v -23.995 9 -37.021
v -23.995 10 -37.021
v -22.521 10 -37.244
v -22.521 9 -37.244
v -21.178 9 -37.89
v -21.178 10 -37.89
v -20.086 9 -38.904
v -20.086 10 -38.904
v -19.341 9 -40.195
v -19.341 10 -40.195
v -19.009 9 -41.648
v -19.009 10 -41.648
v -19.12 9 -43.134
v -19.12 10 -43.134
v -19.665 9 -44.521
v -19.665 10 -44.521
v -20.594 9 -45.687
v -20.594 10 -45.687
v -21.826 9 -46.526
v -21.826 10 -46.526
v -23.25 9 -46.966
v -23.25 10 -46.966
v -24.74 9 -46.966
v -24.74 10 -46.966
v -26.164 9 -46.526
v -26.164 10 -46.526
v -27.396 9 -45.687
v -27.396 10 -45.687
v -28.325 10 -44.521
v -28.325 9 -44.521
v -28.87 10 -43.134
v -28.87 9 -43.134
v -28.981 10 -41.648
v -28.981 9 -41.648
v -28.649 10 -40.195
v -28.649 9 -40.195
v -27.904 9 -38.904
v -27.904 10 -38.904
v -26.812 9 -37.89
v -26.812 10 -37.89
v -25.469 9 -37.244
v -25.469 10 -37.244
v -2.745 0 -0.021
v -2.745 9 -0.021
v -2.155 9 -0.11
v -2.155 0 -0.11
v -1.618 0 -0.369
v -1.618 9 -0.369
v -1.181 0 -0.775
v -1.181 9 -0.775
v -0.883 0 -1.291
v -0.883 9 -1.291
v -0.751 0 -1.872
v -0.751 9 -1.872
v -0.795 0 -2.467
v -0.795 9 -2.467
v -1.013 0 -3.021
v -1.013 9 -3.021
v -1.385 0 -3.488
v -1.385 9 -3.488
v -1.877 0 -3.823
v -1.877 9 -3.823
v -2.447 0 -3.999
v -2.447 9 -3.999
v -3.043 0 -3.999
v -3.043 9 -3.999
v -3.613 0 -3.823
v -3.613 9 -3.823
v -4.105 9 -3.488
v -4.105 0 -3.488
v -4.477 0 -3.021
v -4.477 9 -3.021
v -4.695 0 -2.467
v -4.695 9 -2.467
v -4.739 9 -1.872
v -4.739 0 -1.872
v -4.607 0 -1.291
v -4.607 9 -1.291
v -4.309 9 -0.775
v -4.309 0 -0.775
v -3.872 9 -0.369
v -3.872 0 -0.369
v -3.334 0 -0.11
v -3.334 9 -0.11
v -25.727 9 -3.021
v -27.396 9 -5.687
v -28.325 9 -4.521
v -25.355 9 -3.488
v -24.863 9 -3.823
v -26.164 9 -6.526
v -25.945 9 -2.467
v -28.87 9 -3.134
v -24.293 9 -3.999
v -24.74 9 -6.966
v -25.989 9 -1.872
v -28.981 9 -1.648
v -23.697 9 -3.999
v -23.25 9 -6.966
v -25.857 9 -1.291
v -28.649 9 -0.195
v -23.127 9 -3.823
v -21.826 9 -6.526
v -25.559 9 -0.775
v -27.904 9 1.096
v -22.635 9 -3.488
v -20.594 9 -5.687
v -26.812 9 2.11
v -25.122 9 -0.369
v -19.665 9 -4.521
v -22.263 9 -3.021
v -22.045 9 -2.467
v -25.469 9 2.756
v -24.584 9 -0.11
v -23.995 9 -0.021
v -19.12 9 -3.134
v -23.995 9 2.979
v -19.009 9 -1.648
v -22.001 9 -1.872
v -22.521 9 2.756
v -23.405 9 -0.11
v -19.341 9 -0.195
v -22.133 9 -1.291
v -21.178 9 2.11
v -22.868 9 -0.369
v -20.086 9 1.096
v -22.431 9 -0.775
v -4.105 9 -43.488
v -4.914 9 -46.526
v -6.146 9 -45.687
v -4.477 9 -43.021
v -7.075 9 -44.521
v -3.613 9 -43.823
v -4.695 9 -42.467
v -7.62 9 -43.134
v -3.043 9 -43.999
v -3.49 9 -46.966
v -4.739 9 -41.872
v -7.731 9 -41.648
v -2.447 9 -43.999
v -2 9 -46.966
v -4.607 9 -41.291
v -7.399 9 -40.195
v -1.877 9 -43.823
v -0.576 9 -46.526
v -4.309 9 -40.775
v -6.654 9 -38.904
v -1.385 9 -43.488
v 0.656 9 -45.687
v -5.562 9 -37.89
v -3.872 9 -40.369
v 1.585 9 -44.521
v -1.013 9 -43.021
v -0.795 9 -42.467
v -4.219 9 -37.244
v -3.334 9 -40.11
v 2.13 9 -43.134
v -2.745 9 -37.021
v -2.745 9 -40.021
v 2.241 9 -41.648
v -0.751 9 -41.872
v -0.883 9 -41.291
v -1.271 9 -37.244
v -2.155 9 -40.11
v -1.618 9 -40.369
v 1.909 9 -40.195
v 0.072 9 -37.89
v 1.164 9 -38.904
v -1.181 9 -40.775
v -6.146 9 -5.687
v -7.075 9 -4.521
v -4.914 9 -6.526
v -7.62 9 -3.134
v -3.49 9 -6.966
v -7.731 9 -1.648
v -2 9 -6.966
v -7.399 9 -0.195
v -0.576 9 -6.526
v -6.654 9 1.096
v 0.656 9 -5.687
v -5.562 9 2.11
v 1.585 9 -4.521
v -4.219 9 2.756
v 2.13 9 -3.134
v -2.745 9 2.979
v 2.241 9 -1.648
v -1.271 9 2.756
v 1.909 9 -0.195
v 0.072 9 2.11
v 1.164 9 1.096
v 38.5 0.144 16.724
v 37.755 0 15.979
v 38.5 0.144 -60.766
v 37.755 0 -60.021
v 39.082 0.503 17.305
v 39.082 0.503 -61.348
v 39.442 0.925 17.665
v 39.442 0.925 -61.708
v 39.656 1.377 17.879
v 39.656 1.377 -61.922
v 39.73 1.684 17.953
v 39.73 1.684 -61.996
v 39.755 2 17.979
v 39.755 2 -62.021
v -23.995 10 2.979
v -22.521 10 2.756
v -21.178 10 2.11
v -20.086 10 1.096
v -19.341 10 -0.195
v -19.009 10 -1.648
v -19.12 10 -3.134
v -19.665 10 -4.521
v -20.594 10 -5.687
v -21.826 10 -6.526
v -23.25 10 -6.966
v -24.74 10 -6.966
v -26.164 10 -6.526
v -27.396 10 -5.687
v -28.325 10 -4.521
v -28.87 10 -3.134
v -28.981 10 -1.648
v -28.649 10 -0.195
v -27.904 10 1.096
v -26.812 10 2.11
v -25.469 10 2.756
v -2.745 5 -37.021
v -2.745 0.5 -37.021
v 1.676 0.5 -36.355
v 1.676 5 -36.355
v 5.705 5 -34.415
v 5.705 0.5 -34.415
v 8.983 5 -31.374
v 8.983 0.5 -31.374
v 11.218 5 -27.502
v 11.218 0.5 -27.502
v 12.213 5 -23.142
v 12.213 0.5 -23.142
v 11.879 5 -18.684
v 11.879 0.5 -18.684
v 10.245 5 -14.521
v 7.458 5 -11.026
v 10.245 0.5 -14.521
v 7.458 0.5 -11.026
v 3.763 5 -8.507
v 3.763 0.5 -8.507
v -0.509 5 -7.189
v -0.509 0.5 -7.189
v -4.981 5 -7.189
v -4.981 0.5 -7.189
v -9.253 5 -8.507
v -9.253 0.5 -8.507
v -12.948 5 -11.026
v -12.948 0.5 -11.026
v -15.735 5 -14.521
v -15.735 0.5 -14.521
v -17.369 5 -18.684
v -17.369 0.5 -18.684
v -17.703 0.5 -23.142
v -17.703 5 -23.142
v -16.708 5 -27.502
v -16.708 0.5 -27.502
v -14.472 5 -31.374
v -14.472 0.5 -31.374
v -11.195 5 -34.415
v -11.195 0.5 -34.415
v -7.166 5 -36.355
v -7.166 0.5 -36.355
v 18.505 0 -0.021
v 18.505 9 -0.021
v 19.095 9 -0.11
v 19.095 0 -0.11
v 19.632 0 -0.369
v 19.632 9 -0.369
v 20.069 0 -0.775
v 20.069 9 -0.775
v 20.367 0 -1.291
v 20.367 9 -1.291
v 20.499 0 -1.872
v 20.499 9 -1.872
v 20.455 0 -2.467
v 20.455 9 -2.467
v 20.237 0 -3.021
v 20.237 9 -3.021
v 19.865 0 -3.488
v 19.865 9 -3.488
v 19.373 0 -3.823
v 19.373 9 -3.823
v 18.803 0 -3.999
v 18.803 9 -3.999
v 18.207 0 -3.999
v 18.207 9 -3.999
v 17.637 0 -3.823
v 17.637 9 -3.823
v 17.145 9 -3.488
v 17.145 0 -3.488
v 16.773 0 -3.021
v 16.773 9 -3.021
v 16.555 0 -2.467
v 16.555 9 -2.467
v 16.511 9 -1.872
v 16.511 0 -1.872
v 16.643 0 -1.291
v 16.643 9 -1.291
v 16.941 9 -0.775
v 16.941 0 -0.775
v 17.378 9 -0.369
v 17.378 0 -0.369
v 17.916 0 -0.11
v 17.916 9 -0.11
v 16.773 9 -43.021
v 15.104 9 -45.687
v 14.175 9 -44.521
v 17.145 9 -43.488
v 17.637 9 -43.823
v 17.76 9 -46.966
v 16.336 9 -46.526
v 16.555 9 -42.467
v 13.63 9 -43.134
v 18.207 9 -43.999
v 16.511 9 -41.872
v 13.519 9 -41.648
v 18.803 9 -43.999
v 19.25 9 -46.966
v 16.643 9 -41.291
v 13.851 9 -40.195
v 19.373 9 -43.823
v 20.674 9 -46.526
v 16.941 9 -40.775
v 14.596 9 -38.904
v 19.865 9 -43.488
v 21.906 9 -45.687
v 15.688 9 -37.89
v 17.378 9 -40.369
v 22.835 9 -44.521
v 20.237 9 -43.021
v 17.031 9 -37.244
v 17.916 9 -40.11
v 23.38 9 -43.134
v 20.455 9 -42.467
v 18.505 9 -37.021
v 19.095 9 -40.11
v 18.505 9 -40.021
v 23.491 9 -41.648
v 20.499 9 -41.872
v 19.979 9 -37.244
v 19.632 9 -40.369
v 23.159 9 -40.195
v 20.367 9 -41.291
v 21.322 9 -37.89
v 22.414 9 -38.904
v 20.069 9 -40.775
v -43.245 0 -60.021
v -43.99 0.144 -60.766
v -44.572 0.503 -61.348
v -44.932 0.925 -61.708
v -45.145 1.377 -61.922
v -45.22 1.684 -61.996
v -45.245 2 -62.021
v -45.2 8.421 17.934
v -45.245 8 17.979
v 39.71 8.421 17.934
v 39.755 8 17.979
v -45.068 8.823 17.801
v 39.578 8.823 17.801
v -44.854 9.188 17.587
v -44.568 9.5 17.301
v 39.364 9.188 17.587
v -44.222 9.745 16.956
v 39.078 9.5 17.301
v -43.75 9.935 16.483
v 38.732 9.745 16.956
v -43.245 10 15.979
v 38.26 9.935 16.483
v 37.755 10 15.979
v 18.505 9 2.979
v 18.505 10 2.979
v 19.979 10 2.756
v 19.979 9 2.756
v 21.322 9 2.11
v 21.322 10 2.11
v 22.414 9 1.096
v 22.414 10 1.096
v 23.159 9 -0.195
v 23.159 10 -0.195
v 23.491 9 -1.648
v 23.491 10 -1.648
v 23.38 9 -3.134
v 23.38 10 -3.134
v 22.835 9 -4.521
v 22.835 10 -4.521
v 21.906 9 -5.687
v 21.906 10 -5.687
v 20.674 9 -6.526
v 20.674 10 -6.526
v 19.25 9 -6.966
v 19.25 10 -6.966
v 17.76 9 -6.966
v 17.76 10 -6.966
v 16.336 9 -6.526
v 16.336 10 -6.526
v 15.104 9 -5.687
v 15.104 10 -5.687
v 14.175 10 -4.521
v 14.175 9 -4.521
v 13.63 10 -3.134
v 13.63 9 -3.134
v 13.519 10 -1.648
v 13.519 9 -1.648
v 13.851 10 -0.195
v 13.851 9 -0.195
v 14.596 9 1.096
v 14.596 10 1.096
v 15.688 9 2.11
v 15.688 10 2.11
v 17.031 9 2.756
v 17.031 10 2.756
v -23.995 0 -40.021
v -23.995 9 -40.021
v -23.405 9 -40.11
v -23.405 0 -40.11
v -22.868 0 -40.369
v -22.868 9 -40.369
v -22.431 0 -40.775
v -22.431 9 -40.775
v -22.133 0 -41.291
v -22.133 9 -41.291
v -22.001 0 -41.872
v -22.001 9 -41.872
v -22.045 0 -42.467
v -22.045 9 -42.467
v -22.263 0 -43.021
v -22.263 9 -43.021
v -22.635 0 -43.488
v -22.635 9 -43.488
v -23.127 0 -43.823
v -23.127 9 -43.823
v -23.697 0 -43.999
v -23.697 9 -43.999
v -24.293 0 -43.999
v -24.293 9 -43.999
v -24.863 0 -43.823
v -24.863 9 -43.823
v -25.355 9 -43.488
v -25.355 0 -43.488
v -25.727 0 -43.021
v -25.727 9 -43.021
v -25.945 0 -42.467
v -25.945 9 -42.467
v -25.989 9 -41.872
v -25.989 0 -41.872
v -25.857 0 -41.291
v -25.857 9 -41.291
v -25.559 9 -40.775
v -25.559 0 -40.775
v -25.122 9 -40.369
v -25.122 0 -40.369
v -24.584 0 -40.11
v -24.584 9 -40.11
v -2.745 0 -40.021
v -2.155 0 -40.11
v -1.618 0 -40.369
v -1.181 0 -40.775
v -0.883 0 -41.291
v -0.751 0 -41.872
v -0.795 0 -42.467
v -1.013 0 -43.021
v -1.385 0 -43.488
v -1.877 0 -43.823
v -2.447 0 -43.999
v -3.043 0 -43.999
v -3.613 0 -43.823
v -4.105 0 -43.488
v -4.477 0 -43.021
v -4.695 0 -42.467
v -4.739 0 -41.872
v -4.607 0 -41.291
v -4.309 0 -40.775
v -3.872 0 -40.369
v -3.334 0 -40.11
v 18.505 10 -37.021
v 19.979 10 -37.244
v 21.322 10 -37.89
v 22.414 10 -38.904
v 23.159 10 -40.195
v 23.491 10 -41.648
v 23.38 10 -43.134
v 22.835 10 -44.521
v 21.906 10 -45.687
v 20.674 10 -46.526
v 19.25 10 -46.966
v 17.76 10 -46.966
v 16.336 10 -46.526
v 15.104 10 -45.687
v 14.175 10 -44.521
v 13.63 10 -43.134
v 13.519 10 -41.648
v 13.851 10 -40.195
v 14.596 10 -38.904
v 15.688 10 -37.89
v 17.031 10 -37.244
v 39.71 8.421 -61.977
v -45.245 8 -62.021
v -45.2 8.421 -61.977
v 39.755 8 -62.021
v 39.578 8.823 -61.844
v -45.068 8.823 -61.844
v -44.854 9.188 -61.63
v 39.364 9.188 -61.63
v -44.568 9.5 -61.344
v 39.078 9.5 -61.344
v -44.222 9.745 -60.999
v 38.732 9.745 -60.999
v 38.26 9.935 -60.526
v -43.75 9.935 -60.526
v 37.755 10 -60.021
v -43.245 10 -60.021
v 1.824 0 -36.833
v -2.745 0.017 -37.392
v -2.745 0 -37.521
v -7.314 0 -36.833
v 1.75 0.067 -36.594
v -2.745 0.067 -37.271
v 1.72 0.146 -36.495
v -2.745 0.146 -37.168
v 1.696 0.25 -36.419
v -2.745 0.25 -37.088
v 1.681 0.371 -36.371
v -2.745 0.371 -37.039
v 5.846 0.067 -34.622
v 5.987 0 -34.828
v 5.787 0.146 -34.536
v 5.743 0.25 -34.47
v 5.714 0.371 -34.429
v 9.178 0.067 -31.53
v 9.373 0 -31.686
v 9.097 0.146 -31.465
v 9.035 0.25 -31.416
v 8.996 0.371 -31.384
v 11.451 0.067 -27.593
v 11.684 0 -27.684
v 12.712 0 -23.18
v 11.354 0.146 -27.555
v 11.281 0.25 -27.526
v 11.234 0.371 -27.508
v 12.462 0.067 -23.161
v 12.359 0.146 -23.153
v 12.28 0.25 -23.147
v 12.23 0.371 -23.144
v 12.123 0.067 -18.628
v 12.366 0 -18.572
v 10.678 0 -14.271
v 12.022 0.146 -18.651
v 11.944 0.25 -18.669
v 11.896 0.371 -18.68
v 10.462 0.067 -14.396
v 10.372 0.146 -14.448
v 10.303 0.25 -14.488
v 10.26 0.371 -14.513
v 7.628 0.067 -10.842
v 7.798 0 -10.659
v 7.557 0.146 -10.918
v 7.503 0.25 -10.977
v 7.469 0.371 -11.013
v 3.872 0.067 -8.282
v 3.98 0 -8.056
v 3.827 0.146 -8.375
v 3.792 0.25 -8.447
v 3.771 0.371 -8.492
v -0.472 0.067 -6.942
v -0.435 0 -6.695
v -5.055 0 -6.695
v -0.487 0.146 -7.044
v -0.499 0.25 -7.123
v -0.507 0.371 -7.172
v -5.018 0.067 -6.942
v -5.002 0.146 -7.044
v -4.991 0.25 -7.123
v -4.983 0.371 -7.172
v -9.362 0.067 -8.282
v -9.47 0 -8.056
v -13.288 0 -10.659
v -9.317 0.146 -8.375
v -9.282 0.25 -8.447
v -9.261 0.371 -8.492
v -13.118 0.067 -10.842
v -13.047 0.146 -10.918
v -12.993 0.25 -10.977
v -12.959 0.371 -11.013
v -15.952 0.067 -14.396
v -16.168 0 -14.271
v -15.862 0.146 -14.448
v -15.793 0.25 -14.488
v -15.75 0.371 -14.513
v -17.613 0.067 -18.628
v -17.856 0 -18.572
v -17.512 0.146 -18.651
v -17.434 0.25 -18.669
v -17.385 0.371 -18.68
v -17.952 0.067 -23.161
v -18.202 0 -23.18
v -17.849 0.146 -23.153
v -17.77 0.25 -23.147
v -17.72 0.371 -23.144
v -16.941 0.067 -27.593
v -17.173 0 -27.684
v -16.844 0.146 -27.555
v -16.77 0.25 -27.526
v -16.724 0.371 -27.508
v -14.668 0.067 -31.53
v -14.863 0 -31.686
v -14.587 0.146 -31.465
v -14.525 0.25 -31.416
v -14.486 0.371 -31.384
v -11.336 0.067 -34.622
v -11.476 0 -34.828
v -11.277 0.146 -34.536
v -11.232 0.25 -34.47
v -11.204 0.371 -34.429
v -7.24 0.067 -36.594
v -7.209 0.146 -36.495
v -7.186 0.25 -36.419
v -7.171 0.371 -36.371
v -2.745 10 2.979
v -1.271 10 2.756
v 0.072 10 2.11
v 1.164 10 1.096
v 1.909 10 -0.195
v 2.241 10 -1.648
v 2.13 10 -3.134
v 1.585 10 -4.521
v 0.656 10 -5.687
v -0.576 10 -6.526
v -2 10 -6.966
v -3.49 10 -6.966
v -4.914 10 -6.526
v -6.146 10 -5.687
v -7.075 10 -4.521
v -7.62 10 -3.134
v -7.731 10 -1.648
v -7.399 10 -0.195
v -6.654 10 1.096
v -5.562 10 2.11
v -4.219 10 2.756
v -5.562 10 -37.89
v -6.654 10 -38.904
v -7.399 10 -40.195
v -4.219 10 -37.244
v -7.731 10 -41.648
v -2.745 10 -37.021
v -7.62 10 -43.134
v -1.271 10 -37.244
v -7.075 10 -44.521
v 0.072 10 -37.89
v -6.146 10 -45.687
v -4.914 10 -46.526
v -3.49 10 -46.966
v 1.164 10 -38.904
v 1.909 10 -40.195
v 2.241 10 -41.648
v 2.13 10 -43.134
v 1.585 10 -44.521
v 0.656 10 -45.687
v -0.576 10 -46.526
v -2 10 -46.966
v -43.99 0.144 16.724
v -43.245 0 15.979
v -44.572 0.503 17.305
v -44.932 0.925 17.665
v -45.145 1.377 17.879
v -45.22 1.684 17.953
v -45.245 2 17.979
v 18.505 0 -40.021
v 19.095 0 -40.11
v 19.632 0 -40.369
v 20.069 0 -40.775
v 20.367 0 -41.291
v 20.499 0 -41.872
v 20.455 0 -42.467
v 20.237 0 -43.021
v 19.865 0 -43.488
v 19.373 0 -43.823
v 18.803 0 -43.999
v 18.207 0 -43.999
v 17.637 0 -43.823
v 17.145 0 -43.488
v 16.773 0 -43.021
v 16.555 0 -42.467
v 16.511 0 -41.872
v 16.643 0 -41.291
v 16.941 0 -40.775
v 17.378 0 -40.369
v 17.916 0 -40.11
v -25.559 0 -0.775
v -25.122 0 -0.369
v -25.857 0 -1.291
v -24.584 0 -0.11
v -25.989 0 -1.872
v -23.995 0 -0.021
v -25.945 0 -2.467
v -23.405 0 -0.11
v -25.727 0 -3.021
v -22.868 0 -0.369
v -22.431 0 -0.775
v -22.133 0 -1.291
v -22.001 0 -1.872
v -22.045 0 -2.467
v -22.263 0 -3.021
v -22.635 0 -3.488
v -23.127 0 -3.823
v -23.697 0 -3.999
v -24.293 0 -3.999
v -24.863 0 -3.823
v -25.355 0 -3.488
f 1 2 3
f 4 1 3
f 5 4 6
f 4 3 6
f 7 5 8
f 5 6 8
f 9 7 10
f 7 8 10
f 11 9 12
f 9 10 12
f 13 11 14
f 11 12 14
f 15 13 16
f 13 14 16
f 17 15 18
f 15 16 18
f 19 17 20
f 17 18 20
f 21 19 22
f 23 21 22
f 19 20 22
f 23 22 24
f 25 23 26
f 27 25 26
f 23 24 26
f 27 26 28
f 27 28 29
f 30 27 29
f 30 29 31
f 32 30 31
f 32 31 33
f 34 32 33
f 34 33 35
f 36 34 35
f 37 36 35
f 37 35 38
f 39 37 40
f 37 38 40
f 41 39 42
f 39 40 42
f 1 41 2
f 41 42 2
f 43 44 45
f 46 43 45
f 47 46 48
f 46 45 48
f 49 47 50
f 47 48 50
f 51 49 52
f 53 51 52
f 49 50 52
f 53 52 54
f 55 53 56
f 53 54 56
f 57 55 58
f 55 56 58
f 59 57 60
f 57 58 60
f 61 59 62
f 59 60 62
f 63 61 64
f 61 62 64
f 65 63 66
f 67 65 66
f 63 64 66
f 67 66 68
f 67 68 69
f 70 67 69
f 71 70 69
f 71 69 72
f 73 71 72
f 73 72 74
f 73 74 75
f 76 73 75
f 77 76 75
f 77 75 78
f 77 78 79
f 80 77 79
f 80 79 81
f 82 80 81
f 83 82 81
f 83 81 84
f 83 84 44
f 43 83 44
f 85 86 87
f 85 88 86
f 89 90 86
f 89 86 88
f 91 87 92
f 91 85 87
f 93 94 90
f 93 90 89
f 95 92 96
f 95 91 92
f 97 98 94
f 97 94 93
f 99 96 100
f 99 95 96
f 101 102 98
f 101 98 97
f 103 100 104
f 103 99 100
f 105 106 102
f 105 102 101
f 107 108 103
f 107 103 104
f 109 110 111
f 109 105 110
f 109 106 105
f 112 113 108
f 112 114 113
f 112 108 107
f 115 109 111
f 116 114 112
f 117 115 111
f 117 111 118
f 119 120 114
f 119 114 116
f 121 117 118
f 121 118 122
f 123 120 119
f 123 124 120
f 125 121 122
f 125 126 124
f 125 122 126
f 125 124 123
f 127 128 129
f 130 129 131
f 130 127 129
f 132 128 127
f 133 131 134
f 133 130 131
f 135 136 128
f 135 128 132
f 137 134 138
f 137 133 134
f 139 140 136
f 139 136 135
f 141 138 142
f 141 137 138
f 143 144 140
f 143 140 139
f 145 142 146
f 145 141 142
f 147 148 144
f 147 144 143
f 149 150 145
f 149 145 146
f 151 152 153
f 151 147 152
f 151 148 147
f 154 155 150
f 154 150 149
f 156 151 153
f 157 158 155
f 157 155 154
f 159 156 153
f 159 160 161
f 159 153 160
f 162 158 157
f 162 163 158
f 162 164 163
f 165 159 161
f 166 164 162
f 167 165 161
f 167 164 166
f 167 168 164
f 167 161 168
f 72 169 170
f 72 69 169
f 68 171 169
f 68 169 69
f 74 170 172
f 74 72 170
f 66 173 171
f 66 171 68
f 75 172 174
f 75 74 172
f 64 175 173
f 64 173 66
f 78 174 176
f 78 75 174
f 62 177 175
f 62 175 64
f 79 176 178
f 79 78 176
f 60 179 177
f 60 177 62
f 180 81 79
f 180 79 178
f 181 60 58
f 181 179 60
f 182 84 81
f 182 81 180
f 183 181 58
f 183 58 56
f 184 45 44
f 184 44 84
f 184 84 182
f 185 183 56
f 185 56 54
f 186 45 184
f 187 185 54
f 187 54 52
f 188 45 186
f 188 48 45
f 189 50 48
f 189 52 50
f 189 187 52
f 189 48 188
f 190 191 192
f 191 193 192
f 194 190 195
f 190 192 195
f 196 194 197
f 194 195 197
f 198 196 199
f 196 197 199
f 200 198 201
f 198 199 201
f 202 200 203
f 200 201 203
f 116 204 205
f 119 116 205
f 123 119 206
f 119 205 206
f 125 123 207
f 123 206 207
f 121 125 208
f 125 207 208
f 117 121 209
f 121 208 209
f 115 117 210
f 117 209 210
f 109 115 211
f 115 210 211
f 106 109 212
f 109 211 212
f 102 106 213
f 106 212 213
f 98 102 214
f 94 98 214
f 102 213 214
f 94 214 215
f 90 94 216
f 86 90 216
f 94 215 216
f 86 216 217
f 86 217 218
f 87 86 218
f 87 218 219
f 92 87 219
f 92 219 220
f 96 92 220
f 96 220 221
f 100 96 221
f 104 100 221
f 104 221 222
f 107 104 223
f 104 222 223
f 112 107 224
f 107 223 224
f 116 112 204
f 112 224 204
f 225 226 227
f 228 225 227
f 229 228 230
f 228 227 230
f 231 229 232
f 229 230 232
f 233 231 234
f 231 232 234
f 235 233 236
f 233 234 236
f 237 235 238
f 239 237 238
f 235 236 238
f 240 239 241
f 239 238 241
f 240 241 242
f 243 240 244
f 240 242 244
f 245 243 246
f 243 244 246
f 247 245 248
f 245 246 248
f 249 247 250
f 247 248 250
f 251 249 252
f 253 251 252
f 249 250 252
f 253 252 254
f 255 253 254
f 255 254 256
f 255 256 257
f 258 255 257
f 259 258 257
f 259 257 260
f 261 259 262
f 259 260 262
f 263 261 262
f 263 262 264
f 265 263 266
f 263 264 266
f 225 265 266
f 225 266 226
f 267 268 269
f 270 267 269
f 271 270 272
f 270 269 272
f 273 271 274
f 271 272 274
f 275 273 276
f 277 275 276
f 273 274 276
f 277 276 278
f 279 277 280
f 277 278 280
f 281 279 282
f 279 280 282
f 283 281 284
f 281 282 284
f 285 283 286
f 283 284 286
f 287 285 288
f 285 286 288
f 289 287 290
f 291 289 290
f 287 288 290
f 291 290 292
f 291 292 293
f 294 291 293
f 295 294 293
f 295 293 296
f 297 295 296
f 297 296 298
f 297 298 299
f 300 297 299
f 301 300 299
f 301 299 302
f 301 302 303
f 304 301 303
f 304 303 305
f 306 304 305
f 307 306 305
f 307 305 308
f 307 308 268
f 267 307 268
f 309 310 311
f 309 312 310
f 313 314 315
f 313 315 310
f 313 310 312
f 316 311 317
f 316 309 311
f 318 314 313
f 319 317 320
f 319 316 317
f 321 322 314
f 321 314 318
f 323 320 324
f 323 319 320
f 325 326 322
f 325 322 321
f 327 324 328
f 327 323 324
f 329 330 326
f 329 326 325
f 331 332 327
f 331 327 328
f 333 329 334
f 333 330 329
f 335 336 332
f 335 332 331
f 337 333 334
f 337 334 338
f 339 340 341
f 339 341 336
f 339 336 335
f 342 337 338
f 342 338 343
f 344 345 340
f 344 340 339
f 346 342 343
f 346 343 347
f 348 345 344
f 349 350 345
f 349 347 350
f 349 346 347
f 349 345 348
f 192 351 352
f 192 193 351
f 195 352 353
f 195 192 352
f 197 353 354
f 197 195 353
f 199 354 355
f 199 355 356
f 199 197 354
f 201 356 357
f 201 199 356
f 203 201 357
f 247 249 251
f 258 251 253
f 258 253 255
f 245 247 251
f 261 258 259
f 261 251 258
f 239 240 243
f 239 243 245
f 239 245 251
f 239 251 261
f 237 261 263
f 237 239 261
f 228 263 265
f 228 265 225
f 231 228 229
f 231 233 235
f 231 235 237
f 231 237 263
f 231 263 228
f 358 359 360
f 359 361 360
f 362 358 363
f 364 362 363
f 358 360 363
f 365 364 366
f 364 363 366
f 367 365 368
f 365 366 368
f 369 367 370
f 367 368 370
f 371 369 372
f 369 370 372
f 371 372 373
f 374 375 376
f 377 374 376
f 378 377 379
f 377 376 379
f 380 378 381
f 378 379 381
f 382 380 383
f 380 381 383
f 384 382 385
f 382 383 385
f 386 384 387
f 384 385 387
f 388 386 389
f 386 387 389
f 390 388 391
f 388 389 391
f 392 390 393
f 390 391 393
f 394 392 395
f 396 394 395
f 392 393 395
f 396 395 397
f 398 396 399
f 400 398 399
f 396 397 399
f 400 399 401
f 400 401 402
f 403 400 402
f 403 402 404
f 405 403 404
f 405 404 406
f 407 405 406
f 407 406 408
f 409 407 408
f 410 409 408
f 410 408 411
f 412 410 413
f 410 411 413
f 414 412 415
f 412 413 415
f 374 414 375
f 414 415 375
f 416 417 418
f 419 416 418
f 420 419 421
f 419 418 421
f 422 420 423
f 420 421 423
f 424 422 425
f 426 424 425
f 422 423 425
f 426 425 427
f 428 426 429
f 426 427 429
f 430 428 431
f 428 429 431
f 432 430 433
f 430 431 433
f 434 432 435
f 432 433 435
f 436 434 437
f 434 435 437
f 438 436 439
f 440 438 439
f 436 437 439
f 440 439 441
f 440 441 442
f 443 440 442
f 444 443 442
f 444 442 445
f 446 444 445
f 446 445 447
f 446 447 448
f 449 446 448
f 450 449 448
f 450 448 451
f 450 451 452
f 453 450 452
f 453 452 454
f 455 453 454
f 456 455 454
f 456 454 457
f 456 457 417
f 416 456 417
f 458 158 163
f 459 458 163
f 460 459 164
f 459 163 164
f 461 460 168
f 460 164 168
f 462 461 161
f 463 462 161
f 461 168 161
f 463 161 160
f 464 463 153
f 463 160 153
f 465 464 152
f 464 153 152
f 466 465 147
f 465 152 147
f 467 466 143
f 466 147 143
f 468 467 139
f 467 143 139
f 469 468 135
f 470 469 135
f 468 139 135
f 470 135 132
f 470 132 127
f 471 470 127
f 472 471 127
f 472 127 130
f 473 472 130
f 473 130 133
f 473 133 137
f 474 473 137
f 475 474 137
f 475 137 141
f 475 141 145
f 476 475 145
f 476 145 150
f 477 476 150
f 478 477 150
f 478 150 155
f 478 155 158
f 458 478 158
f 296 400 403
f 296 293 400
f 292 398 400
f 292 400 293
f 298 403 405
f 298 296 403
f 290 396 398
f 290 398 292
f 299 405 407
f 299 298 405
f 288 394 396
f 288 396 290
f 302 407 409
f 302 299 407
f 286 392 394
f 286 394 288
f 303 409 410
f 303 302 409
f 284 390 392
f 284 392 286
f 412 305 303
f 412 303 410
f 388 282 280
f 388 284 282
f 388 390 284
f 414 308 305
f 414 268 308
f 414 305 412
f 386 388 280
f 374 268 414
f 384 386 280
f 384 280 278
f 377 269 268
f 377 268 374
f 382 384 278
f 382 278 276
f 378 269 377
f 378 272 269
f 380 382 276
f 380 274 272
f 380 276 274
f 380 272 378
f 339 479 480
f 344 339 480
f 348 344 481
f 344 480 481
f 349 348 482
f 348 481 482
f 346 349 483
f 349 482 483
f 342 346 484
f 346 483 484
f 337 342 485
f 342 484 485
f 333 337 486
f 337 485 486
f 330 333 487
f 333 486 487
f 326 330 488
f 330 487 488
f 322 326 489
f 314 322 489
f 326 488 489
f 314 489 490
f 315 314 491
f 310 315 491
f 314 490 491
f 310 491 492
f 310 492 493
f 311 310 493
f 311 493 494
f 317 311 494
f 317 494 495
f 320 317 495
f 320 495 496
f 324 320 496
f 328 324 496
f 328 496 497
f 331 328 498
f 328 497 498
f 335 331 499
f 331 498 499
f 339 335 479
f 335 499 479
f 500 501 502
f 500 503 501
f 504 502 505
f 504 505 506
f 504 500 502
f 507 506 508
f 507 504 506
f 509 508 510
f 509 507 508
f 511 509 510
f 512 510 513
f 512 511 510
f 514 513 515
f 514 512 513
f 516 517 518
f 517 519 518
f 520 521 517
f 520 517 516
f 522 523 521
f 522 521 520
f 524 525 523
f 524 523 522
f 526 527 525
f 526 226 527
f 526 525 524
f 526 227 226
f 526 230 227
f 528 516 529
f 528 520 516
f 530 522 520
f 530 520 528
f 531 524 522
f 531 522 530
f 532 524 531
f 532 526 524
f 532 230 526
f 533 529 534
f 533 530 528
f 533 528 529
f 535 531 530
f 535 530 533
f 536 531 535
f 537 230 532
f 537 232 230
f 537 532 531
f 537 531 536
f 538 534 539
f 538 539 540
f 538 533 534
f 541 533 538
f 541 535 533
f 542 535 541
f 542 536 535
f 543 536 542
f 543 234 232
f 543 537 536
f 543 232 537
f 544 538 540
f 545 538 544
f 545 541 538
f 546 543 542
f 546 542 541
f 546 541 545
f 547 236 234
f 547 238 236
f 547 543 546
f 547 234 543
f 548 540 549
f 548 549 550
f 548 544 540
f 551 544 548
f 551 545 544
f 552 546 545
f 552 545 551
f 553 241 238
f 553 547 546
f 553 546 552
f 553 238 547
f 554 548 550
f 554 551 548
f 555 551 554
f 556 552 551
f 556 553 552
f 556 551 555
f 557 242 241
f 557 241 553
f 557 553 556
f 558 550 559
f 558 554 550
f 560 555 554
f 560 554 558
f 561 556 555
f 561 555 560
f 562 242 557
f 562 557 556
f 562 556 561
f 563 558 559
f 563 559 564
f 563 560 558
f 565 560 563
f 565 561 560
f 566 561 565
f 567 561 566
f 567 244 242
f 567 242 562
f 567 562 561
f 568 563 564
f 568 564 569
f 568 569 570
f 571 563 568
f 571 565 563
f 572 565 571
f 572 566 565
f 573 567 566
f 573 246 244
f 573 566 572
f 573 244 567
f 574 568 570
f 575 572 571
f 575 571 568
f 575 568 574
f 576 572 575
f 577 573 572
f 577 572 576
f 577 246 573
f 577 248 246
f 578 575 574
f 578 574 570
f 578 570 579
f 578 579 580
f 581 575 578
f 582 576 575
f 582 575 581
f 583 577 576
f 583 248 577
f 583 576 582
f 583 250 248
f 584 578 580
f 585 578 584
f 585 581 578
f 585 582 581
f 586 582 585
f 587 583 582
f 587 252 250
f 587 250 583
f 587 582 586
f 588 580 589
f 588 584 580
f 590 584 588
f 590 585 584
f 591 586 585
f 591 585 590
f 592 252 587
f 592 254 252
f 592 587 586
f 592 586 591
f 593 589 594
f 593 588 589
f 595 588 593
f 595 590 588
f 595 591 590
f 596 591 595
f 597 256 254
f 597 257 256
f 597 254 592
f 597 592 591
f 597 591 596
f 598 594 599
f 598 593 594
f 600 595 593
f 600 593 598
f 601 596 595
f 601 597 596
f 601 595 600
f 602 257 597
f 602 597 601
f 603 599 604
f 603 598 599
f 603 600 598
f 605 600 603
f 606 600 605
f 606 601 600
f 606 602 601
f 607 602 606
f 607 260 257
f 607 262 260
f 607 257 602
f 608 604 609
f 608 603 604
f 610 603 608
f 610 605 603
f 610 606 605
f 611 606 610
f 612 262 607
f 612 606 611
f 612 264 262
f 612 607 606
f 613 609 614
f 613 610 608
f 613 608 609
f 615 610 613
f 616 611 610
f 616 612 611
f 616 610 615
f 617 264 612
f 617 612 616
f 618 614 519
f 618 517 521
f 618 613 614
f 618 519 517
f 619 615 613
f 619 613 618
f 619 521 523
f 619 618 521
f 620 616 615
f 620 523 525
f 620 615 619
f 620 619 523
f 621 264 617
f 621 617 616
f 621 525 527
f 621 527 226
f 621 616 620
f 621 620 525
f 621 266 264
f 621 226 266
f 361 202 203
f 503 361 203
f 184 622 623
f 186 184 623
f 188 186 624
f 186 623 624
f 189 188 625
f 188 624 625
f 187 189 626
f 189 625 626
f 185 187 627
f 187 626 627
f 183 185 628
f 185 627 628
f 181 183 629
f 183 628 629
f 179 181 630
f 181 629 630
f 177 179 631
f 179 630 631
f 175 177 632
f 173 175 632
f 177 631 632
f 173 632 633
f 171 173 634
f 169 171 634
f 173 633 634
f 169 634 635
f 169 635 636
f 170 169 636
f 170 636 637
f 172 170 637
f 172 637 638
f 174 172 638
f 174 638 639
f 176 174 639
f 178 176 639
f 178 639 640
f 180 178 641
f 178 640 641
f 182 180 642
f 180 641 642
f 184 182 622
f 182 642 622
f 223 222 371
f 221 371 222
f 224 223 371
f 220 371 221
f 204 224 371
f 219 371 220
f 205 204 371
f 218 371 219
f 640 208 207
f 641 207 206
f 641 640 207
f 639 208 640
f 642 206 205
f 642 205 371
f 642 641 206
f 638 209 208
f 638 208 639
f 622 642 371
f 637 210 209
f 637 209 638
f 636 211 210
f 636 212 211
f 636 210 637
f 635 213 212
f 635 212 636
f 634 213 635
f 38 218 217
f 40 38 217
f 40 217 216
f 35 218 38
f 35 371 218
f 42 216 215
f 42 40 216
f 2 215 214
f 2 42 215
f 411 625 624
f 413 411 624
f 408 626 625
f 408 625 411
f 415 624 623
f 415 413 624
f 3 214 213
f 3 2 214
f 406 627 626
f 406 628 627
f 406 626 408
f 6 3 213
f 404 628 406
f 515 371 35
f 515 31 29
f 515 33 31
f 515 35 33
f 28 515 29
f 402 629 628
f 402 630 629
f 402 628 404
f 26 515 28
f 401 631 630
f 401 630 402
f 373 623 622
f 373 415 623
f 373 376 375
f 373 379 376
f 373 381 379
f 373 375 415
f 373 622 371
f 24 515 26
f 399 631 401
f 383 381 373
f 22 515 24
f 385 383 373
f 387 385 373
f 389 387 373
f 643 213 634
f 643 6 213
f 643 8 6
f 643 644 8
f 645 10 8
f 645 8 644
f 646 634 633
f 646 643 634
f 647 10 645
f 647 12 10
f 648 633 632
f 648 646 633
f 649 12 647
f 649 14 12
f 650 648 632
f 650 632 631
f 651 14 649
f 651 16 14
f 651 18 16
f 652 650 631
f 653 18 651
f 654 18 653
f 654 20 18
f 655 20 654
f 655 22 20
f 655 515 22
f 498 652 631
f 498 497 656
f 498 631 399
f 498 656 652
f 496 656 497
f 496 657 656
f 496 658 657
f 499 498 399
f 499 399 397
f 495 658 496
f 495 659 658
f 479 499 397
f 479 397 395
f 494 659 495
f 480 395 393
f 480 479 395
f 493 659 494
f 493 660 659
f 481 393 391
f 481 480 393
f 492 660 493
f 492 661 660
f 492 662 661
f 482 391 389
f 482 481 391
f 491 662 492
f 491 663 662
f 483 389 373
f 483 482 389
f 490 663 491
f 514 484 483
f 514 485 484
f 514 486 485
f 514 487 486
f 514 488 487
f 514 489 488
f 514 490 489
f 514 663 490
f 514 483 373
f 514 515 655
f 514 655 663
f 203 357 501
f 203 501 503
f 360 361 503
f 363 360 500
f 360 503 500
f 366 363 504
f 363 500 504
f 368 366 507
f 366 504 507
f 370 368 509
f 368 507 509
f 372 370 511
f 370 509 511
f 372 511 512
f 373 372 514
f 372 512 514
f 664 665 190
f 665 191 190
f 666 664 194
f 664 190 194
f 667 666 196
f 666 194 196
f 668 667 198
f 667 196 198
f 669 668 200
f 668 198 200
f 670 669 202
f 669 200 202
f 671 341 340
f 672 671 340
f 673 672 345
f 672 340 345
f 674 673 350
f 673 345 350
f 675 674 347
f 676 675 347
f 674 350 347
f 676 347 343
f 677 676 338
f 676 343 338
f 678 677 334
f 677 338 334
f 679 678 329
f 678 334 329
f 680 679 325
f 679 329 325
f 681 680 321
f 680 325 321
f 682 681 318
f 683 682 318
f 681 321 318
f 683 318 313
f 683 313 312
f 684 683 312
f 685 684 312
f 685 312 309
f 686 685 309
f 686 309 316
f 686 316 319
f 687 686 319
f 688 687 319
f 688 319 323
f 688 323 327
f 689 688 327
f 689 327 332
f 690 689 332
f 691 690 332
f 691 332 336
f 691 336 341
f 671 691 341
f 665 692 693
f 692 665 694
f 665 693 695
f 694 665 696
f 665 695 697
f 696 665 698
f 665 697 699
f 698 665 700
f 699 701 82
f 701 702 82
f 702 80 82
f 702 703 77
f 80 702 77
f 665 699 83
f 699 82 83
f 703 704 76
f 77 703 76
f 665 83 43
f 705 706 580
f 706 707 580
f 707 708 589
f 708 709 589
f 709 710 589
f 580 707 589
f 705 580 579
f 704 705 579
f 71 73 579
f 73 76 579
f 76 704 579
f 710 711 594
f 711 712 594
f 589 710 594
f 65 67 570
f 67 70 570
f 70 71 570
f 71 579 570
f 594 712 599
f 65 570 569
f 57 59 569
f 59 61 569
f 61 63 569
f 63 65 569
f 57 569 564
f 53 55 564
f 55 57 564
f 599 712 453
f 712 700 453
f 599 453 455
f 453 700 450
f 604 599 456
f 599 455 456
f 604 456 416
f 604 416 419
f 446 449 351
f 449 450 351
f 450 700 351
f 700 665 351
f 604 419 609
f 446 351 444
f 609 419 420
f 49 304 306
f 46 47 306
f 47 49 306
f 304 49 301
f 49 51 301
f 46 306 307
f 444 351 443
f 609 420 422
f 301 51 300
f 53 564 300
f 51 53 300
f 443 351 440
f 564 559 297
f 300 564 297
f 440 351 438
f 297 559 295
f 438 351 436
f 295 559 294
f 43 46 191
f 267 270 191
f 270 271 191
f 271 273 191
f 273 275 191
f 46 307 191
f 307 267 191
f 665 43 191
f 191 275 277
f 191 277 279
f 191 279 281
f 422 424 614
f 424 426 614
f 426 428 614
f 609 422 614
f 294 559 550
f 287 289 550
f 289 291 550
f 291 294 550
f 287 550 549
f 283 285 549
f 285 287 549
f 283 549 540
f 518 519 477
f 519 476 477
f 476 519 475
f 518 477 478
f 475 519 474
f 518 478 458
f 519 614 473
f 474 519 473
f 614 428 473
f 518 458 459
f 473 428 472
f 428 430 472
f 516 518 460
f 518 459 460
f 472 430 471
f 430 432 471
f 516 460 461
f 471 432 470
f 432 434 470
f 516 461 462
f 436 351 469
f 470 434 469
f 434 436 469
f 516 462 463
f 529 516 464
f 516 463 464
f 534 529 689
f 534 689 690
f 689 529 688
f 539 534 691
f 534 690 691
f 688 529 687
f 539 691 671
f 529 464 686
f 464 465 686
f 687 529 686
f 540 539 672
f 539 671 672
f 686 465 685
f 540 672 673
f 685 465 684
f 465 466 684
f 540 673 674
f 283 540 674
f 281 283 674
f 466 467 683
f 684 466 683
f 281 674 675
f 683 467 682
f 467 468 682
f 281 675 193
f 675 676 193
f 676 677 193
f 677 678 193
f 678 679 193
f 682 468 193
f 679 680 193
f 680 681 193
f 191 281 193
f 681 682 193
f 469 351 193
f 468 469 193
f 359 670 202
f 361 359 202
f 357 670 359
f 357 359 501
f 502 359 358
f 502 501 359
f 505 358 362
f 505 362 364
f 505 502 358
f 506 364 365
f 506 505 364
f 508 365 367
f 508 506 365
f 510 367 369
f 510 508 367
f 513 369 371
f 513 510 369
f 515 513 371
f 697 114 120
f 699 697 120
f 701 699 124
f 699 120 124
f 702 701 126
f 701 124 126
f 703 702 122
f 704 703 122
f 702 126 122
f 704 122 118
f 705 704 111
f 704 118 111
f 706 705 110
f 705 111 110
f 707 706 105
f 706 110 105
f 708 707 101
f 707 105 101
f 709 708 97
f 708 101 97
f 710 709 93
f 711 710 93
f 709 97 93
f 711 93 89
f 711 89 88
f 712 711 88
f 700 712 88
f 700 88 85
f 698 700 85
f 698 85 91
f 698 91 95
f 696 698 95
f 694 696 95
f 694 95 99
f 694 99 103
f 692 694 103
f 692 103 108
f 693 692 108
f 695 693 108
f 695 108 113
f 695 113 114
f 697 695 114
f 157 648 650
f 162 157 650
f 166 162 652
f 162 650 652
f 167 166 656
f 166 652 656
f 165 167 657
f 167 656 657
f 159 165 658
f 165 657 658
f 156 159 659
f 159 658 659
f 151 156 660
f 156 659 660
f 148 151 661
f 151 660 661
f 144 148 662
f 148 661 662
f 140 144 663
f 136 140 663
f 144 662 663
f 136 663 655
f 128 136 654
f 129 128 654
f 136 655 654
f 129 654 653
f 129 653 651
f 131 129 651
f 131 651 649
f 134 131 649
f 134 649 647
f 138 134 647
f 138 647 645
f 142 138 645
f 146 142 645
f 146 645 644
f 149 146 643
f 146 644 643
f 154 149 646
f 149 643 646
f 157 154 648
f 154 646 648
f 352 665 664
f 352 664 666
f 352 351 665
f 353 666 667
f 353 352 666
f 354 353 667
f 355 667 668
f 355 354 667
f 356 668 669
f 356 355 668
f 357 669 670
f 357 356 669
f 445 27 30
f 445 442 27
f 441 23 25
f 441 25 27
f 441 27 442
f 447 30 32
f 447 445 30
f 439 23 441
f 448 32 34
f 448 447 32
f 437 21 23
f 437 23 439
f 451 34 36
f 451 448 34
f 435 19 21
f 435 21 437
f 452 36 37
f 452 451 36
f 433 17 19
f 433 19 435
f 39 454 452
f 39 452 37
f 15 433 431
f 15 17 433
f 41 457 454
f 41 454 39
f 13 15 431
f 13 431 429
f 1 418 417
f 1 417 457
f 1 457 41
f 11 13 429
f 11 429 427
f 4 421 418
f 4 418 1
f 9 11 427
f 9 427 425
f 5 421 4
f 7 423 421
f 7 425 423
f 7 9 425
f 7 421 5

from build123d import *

# Parameters (mm, degrees)
SKETCH_1_W          = 85
SKETCH_1_H          = 80
EXTRUDE_1_DEPTH     = 10
SKETCH_2_R          = 5
SKETCH_2_R_2        = 2
CUT_EXTRUDE_1_DEPTH = 1
SKETCH_2_2_R        = 2
CUT_EXTRUDE_2_DEPTH = 78.419437026
SKETCH_3_R          = 15
CUT_EXTRUDE_3_DEPTH = 5
FILLET_1_R          = 0.5
FILLET_2_R          = 2
FILLET_3_R          = 2


with BuildPart() as part:
    # 草图1 → 凸台-拉伸1 (new body)
    with BuildSketch(Plane(origin=(0, 0, 0), x_dir=(1, 0, 0), z_dir=(0, 1, 0))):
        with Locations((-2.744934646, 22.021489166)):
            Rectangle(SKETCH_1_W, SKETCH_1_H)
    extrude(amount=EXTRUDE_1_DEPTH)

    # 草图2 → 切除-拉伸1 (cut)
    # profile 1 of 6: a face of its own
    with BuildSketch(Plane(origin=(0, 10, 0), x_dir=(1, 0, 0), z_dir=(0, 1, 0))):
        with Locations(Location((-2.744934646, 42.021489166, 0), (0, 0, 270))):
            Circle(SKETCH_2_R)
        with Locations(Location((-2.744934646, 42.021489166, 0), (0, 0, 270))):
            Circle(SKETCH_2_R_2, mode=Mode.SUBTRACT)
    # profile 2 of 6: a face of its own
    with BuildSketch(Plane(origin=(0, 10, 0), x_dir=(1, 0, 0), z_dir=(0, 1, 0))):
        with Locations(Location((-2.744934646, 2.021489166, 0), (0, 0, 270))):
            Circle(SKETCH_2_R)
        with Locations(Location((-2.744934646, 2.021489166, 0), (0, 0, 270))):
            Circle(SKETCH_2_R_2, mode=Mode.SUBTRACT)
    # profile 3 of 6: a face of its own
    with BuildSketch(Plane(origin=(0, 10, 0), x_dir=(1, 0, 0), z_dir=(0, 1, 0))):
        with Locations(Location((-23.994934646, 2.021489166, 0), (0, 0, 270))):
            Circle(SKETCH_2_R)
        with Locations(Location((-23.994934646, 2.021489166, 0), (0, 0, 270))):
            Circle(SKETCH_2_R_2, mode=Mode.SUBTRACT)
    # profile 4 of 6: a face of its own
    with BuildSketch(Plane(origin=(0, 10, 0), x_dir=(1, 0, 0), z_dir=(0, 1, 0))):
        with Locations(Location((18.505065354, 2.021489166, 0), (0, 0, 270))):
            Circle(SKETCH_2_R)
        with Locations(Location((18.505065354, 2.021489166, 0), (0, 0, 270))):
            Circle(SKETCH_2_R_2, mode=Mode.SUBTRACT)
    # profile 5 of 6: a face of its own
    with BuildSketch(Plane(origin=(0, 10, 0), x_dir=(1, 0, 0), z_dir=(0, 1, 0))):
        with Locations(Location((18.505065354, 42.021489166, 0), (0, 0, 270))):
            Circle(SKETCH_2_R)
        with Locations(Location((18.505065354, 42.021489166, 0), (0, 0, 270))):
            Circle(SKETCH_2_R_2, mode=Mode.SUBTRACT)
    # profile 6 of 6: a face of its own
    with BuildSketch(Plane(origin=(0, 10, 0), x_dir=(1, 0, 0), z_dir=(0, 1, 0))):
        with Locations(Location((-23.994934646, 42.021489166, 0), (0, 0, 270))):
            Circle(SKETCH_2_R)
        with Locations(Location((-23.994934646, 42.021489166, 0), (0, 0, 270))):
            Circle(SKETCH_2_R_2, mode=Mode.SUBTRACT)
    extrude(amount=-CUT_EXTRUDE_1_DEPTH, mode=Mode.SUBTRACT)

    # 草图2<2> → 切除-拉伸2 (cut, through all)
    with BuildSketch(Plane(origin=(0, 10, 0), x_dir=(1, 0, 0), z_dir=(0, 1, 0))):
        with Locations(Location((18.505065354, 42.021489166, 0), (0, 0, 270))):
            Circle(SKETCH_2_2_R)
        with Locations(Location((-2.744934646, 42.021489166, 0), (0, 0, 270))):
            Circle(SKETCH_2_2_R)
        with Locations(Location((-23.994934646, 42.021489166, 0), (0, 0, 270))):
            Circle(SKETCH_2_2_R)
        with Locations(Location((-23.994934646, 2.021489166, 0), (0, 0, 270))):
            Circle(SKETCH_2_2_R)
        with Locations(Location((-2.744934646, 2.021489166, 0), (0, 0, 270))):
            Circle(SKETCH_2_2_R)
        with Locations(Location((18.505065354, 2.021489166, 0), (0, 0, 270))):
            Circle(SKETCH_2_2_R)
    extrude(amount=-CUT_EXTRUDE_2_DEPTH, mode=Mode.SUBTRACT)

    # 草图3 → 切除-拉伸3 (cut)
    with BuildSketch(Plane(origin=(0, 0, 0), x_dir=(-1, 0, 0), z_dir=(0, -1, 0))):
        with Locations(Location((2.744934646, 22.021489166, 0), (0, 0, 90))):
            Circle(SKETCH_3_R)
    extrude(amount=-CUT_EXTRUDE_3_DEPTH, mode=Mode.SUBTRACT)

    # 圆角1
    fillet_1_edges = [part.edges().sort_by_distance(p)[0] for p in [
        (-2.744934646, 0, -7.021489166),
    ]]
    fillet(fillet_1_edges, radius=FILLET_1_R)

    # 圆角2
    fillet_2_edges = [part.edges().sort_by_distance(p)[0] for p in [
        (-2.744934646, 0, -62.021489166),
        (39.755065354, 0, -22.021489166),
        (-2.744934646, 0, 17.978510834),
        (-45.244934646, 0, -22.021489166),
    ]]
    fillet(fillet_2_edges, radius=FILLET_2_R)

    # 圆角3
    fillet_3_edges = [part.edges().sort_by_distance(p)[0] for p in [
        (39.755065354, 10, -22.021489166),
        (-2.744934646, 10, -62.021489166),
        (-45.244934646, 10, -22.021489166),
        (-2.744934646, 10, 17.978510834),
    ]]
    fillet(fillet_3_edges, radius=FILLET_3_R)


solid = part.part
